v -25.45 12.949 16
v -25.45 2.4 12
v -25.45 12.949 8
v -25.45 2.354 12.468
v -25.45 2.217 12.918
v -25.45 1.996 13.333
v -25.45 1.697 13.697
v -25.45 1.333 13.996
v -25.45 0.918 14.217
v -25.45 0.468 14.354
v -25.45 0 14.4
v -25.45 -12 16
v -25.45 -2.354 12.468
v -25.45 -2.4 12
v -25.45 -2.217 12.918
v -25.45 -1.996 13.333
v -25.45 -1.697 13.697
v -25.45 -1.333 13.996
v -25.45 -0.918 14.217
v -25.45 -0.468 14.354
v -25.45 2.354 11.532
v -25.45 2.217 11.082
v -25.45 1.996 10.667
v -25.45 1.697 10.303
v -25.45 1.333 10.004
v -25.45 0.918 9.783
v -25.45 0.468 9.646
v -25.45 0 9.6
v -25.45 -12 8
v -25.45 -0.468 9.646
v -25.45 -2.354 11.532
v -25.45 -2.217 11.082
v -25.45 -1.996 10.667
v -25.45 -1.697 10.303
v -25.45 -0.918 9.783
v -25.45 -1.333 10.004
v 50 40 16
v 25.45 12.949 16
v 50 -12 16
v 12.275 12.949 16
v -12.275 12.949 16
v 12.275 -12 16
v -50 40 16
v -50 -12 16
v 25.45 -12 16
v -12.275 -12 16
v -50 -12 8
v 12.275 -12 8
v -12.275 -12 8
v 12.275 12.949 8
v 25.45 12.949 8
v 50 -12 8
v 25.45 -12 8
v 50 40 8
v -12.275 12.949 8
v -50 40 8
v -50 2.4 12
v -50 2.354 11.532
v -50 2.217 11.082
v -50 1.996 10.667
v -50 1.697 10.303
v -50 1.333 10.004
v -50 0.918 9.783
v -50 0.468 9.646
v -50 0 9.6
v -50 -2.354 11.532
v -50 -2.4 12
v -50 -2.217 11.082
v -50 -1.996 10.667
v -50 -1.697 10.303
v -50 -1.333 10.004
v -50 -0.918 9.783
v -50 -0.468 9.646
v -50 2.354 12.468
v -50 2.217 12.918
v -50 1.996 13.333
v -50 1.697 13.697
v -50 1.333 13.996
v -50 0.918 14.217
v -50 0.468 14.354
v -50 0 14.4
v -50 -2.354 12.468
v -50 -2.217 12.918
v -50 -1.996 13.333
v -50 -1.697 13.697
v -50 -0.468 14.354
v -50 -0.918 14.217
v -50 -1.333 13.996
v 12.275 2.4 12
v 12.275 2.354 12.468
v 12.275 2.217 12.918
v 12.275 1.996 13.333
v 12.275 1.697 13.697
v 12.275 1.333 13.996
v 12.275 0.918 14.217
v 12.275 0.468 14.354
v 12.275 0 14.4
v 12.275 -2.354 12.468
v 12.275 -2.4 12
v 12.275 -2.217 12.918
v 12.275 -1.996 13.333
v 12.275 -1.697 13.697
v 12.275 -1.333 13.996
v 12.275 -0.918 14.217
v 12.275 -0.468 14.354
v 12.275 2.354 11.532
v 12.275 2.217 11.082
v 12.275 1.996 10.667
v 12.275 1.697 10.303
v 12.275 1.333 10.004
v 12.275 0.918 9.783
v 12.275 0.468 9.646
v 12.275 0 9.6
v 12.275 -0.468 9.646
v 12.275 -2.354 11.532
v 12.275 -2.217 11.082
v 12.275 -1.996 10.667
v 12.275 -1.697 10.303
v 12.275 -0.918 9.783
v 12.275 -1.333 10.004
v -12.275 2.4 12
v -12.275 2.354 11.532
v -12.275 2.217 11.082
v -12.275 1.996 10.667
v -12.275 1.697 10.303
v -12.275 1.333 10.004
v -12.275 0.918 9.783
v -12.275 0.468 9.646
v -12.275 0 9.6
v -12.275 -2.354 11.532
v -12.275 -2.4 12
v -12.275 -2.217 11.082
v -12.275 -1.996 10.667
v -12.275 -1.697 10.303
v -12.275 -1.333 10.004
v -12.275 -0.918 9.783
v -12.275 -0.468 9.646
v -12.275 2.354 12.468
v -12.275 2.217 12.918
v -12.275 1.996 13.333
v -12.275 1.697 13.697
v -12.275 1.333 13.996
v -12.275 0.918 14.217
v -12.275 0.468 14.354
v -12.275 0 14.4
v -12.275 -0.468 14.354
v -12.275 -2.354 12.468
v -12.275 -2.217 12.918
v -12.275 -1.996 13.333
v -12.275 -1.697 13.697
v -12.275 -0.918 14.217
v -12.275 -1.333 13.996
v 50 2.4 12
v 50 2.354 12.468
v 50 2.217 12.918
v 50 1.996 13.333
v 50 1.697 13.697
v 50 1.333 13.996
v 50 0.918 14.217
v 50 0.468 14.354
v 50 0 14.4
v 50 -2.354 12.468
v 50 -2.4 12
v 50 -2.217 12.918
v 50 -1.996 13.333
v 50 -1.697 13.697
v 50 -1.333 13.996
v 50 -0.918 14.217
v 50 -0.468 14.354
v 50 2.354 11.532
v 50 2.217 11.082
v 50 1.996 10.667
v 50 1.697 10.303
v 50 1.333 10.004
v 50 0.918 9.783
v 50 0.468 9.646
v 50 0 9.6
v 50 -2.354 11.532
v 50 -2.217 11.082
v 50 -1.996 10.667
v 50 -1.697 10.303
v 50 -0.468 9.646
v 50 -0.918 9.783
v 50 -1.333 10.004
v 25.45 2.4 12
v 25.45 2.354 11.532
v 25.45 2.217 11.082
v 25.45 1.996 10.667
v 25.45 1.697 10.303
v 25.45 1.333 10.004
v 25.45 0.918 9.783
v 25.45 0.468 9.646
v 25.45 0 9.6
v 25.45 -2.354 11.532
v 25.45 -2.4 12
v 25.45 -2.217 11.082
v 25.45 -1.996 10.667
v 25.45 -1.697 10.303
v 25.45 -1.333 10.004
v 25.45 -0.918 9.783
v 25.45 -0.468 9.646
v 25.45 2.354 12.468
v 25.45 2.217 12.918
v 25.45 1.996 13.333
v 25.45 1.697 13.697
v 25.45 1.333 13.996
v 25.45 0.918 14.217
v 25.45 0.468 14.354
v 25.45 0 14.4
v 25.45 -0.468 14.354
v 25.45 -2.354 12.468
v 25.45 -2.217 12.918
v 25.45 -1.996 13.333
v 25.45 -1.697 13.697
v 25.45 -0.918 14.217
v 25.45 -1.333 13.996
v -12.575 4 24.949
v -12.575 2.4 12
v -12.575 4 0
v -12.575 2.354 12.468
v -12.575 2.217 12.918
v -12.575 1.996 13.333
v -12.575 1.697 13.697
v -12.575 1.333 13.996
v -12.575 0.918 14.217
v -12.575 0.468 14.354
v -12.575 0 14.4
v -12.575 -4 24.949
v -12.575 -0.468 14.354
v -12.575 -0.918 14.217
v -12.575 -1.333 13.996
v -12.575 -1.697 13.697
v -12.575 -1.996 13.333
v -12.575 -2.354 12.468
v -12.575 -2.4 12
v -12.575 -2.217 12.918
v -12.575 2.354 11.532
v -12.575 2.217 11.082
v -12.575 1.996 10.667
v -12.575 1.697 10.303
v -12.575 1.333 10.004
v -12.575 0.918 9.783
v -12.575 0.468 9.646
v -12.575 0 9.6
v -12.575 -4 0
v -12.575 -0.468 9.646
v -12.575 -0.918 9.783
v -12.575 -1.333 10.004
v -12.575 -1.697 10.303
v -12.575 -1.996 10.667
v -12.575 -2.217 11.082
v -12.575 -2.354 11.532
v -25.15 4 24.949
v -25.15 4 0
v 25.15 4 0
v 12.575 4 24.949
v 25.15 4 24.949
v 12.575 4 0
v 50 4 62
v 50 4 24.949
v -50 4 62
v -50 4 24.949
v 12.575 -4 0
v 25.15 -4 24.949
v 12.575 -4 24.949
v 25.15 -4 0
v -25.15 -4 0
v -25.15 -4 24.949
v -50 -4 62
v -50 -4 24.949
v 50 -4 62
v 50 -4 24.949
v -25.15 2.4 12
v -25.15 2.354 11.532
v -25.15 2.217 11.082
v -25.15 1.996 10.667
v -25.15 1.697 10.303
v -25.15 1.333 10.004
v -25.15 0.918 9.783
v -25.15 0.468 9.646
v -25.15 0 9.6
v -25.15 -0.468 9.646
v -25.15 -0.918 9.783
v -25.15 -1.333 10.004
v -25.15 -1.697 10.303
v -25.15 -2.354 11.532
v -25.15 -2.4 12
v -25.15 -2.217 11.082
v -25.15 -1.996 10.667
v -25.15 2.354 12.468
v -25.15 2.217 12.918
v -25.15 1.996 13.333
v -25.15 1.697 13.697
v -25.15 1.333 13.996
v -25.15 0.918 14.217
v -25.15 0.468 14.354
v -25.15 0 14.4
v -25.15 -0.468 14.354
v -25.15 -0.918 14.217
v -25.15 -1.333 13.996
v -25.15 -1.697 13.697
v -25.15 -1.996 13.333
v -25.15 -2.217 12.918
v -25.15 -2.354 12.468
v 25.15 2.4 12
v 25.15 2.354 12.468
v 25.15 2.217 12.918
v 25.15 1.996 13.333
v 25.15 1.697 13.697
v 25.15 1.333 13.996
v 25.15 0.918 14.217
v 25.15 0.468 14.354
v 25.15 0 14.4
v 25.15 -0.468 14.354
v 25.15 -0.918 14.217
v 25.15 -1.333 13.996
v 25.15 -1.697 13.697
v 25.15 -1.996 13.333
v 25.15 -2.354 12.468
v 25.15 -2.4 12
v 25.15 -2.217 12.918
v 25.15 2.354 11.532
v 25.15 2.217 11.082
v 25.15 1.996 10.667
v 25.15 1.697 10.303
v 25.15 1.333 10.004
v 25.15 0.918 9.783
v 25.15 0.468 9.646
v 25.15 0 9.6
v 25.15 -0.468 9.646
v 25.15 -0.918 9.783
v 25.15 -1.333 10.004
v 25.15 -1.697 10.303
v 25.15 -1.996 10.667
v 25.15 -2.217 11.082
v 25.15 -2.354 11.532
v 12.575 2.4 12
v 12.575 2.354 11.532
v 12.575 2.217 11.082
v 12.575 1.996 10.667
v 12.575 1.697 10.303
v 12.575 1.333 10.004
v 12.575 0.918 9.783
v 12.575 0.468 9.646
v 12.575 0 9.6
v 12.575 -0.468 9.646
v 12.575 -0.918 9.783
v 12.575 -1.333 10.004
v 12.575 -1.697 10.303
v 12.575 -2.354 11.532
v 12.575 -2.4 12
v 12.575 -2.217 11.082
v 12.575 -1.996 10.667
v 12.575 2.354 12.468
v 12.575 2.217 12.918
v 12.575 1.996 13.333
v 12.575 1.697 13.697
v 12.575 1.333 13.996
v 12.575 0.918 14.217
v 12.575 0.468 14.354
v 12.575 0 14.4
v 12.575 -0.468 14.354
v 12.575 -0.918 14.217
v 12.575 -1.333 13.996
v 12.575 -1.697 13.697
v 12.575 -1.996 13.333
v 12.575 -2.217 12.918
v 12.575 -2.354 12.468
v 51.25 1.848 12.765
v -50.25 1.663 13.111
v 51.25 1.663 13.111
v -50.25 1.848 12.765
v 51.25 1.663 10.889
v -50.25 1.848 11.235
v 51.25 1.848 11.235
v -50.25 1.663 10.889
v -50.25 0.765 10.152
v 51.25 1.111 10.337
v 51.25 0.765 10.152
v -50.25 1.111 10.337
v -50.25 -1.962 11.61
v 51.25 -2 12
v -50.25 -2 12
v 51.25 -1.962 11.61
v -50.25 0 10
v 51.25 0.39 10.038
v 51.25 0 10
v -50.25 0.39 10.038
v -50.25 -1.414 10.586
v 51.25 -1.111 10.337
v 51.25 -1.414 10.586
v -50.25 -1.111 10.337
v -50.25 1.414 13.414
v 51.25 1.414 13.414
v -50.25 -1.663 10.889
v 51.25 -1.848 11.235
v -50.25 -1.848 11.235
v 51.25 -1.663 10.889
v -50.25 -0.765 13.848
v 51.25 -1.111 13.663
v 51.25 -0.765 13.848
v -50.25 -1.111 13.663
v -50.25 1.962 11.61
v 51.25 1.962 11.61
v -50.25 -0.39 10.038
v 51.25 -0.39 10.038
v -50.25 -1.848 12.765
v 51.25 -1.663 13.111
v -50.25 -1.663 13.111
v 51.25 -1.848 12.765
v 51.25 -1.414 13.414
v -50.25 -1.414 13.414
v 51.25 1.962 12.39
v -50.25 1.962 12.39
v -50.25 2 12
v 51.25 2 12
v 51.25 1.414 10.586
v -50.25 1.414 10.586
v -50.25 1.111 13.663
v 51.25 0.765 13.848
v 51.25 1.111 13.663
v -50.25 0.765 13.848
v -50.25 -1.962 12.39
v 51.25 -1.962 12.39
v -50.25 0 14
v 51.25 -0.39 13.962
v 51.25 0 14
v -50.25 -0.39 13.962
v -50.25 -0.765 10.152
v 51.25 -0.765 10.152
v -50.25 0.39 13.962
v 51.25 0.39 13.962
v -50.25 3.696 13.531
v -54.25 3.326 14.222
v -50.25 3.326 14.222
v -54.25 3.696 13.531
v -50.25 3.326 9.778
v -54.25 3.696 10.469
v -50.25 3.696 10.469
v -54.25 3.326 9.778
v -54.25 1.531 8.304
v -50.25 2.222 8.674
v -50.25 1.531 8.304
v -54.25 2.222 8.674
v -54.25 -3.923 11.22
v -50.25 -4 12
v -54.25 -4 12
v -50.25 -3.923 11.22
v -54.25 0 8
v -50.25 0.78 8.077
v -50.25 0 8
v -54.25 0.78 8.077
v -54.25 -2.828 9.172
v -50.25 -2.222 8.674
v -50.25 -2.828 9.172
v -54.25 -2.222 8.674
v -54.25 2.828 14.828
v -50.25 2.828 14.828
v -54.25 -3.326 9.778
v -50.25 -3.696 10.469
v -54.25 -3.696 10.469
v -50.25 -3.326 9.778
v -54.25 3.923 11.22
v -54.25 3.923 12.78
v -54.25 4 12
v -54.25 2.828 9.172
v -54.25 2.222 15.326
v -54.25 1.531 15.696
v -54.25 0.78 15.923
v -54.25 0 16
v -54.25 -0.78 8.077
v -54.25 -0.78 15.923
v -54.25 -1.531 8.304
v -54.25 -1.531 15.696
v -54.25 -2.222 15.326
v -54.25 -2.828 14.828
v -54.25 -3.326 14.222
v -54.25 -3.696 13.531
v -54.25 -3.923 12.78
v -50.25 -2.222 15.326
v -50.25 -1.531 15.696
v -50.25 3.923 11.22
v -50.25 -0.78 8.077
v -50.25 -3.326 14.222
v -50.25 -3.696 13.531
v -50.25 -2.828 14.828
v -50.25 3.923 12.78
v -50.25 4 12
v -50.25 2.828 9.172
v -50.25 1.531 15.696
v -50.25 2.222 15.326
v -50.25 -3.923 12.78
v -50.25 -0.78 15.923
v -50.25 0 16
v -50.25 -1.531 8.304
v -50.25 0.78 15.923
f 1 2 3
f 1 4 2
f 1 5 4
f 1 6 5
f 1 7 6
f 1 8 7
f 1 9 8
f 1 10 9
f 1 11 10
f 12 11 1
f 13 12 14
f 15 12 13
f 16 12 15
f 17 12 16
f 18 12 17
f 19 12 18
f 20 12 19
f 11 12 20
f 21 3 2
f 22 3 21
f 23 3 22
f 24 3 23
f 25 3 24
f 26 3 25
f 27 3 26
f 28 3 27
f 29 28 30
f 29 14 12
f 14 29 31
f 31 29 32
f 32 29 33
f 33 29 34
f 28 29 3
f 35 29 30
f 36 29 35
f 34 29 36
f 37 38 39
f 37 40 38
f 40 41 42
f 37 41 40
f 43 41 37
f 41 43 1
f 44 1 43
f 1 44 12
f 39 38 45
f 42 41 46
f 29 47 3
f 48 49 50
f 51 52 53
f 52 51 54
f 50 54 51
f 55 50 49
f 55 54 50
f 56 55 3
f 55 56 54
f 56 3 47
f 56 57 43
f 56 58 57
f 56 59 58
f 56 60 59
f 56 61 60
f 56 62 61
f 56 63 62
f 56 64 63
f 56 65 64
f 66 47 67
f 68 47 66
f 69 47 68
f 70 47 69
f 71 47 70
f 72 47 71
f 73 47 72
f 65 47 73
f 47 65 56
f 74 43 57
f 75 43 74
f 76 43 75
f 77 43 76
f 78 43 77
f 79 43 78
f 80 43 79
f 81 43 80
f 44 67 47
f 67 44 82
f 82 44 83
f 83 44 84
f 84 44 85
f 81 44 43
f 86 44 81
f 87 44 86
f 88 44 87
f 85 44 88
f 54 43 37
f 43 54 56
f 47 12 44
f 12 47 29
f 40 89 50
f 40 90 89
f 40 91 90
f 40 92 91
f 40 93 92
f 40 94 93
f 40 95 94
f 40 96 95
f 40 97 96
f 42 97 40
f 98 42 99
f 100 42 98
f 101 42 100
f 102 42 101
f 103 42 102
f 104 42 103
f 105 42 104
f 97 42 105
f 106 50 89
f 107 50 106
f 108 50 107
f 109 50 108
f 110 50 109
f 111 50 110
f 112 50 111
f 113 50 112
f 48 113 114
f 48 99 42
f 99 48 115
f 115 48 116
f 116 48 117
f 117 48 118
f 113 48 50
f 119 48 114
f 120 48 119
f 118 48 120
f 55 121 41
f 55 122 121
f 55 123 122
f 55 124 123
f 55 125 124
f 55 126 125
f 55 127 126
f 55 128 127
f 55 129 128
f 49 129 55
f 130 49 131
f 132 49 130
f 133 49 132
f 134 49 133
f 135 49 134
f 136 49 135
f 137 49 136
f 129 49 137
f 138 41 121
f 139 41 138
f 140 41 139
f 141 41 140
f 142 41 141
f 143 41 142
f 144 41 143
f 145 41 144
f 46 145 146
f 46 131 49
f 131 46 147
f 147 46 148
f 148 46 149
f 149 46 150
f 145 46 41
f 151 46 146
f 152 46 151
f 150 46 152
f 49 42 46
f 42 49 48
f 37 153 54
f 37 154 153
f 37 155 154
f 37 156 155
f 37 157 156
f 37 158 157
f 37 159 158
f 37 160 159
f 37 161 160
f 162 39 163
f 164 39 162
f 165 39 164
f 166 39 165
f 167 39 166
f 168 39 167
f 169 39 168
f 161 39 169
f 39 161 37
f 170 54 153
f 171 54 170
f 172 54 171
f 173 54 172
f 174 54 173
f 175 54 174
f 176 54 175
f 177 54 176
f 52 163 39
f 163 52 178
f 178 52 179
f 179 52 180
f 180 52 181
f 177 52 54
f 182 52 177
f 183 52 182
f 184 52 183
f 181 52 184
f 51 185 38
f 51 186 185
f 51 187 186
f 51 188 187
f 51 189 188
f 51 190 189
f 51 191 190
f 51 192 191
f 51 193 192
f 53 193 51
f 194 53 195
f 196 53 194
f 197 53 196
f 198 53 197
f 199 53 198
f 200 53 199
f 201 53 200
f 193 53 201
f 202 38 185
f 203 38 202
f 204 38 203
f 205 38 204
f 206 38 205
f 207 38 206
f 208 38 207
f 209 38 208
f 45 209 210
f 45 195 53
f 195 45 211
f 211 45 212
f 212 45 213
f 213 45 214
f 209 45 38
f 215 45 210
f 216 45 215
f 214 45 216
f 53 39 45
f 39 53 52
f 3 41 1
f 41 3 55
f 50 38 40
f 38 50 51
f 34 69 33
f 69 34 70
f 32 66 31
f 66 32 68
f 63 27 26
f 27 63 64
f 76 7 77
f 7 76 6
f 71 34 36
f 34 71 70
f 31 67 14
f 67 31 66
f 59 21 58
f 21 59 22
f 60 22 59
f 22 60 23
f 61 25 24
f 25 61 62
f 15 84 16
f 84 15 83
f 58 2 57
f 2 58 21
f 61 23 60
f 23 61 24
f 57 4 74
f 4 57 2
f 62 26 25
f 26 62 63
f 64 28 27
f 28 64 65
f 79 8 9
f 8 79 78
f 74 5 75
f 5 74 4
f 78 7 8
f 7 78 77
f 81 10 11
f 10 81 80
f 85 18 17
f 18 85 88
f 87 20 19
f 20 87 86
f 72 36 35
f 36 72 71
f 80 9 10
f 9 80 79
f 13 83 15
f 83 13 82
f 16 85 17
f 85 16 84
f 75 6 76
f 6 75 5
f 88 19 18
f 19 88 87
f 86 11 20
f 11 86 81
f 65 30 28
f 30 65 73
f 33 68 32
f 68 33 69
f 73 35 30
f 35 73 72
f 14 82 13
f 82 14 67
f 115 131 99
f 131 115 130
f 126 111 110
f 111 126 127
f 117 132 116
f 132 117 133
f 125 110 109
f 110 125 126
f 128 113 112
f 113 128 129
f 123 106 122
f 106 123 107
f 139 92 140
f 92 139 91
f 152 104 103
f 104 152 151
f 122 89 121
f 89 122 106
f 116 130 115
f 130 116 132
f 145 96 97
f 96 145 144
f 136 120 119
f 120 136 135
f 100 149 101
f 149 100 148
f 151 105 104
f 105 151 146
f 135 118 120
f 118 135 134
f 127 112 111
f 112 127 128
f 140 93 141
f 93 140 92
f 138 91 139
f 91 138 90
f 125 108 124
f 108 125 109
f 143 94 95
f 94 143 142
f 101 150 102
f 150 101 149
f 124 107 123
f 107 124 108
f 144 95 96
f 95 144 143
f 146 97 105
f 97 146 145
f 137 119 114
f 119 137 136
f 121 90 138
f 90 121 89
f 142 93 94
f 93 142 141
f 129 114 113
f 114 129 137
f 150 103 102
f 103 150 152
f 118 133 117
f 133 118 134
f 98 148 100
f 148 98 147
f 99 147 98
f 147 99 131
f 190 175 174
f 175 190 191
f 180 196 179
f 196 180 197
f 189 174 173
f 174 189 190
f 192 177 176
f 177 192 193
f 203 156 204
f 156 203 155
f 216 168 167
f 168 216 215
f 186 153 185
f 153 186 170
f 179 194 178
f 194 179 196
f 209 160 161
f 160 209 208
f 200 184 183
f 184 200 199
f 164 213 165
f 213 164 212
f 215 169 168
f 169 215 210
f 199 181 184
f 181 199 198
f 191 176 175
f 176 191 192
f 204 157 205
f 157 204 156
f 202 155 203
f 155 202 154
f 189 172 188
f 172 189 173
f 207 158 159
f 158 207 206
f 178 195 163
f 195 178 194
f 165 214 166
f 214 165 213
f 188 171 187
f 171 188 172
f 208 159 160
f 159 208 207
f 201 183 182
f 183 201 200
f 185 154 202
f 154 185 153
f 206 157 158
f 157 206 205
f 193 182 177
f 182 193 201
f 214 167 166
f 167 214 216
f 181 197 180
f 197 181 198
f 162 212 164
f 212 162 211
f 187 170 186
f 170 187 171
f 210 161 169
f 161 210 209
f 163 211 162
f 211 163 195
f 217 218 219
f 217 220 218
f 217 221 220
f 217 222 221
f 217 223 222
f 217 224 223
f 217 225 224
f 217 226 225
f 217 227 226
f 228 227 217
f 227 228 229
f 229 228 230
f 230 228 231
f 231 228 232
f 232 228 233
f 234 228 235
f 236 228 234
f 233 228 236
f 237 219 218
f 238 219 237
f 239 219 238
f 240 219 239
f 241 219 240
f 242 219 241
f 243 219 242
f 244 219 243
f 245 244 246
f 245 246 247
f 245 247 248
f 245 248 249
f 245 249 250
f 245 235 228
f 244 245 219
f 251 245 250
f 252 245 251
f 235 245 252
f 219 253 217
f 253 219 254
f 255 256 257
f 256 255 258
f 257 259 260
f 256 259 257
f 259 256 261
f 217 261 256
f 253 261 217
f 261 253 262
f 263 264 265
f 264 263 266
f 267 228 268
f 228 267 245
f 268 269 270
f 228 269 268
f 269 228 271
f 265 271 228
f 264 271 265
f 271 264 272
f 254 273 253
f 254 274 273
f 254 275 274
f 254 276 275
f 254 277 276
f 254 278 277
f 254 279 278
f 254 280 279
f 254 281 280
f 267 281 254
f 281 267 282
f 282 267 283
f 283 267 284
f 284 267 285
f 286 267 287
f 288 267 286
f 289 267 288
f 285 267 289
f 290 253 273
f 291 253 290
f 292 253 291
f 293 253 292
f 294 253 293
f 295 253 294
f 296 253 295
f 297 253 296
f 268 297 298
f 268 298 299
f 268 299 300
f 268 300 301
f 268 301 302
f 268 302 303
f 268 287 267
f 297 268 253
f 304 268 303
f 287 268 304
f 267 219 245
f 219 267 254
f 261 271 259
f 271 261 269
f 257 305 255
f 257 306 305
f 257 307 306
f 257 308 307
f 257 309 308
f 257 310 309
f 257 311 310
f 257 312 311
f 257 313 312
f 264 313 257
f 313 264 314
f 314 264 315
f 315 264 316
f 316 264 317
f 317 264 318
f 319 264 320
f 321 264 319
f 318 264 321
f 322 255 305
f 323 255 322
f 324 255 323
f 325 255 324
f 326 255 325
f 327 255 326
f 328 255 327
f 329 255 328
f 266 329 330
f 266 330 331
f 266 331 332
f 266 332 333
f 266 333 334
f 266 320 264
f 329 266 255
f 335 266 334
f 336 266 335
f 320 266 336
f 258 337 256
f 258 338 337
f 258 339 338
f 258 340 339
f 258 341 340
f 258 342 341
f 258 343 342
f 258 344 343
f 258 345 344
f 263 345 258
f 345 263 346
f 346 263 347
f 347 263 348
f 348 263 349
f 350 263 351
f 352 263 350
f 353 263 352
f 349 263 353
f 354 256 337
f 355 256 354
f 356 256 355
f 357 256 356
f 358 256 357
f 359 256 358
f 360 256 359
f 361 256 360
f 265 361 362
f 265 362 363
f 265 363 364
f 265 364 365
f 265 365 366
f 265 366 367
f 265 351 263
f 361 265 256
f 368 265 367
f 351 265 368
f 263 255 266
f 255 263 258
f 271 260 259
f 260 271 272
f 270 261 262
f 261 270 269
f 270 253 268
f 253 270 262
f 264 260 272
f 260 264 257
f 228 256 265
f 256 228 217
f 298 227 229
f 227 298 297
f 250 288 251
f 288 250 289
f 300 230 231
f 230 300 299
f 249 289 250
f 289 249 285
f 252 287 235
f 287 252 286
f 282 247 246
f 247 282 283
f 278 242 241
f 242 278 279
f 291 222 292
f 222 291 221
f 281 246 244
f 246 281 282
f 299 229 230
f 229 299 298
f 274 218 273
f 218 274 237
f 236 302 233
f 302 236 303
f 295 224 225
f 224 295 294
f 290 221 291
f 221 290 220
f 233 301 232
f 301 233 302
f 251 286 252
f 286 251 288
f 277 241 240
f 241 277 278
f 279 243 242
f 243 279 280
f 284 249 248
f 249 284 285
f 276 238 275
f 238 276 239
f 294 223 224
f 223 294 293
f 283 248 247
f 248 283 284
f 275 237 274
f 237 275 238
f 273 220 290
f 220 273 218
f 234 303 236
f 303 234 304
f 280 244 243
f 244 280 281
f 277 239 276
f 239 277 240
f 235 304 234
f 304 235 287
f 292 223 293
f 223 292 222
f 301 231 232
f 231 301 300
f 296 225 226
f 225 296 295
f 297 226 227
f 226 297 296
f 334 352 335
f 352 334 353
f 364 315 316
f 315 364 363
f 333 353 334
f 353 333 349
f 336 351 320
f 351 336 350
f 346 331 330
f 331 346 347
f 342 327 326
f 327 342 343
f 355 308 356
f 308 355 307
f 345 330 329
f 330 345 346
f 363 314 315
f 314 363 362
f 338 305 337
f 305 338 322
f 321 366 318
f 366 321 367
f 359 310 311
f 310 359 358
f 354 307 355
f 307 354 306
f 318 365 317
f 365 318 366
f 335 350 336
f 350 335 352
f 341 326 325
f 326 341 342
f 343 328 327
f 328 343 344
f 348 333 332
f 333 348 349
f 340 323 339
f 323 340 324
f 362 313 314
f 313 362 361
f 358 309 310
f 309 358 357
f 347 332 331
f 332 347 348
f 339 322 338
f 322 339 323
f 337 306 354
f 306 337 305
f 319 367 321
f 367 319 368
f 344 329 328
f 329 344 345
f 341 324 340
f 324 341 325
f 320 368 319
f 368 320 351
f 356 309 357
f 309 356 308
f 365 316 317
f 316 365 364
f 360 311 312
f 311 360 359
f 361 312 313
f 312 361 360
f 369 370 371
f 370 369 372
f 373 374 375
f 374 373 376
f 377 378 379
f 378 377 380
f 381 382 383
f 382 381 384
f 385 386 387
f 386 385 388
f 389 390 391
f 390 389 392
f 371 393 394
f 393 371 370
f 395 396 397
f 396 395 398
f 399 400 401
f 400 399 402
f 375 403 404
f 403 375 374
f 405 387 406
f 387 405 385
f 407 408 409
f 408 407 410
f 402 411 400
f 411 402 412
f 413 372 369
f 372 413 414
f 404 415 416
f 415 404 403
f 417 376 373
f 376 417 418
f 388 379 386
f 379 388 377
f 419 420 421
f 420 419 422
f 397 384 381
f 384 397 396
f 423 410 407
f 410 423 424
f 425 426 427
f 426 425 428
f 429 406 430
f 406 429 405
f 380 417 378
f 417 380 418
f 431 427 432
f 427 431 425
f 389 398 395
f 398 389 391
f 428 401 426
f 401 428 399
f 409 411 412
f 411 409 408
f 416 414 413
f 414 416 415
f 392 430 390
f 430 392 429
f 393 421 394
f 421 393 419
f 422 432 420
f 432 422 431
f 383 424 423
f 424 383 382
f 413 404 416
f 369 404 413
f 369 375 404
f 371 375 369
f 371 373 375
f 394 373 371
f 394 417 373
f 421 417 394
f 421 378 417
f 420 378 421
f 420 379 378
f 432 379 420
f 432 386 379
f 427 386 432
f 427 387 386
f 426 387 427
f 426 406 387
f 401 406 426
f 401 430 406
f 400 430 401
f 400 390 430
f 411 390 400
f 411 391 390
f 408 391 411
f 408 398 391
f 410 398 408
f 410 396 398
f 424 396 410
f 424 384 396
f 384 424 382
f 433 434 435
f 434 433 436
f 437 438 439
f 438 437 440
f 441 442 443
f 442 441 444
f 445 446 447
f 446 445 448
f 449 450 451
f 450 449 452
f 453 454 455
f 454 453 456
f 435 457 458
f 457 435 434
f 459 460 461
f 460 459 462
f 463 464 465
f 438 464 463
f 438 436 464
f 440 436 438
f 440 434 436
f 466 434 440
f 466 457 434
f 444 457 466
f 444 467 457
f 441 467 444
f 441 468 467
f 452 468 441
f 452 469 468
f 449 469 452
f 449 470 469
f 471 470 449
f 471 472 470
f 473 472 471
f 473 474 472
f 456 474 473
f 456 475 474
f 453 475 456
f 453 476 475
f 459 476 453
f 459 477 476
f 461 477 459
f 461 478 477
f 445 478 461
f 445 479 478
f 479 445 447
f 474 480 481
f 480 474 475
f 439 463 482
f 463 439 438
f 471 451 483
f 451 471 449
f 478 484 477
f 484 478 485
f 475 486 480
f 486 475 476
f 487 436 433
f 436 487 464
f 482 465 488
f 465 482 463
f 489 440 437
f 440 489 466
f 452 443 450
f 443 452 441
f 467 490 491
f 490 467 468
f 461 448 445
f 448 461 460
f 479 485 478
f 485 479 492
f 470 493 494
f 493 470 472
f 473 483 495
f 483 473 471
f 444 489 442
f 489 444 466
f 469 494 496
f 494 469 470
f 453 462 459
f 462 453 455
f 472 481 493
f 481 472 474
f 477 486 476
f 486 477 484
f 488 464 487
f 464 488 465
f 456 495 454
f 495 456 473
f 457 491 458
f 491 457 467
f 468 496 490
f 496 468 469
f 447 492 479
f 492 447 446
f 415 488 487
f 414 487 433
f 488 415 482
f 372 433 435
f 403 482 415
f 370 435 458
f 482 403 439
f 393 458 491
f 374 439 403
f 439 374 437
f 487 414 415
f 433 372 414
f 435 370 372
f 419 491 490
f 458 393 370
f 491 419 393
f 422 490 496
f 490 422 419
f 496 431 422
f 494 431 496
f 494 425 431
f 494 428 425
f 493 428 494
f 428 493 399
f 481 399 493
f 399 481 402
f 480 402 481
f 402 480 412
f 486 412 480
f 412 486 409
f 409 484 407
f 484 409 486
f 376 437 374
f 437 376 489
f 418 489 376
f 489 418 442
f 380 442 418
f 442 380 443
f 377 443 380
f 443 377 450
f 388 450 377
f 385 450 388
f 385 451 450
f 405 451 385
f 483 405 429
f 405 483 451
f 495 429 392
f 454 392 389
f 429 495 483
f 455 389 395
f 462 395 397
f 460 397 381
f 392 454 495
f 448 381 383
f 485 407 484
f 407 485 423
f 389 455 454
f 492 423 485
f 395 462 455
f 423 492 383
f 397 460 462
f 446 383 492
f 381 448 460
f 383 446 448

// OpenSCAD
$fn = 32;

// ------------------------------------------------------------------------
// Butt hinge: hinge 100 mm, leaf swung 270 deg
// Every part is its own module, assembly() places every instance.
// ------------------------------------------------------------------------

// --- part 1 ---
module hinge_base() {
  difference() {
    union() {
      translate([-50, -12, -4]) cube([24.55, 52, 8]);
      translate([-12.275, -12, -4]) cube([24.55, 52, 8]);
      translate([25.45, -12, -4]) cube([24.55, 52, 8]);
      translate([-50, 12.949, -4]) cube([100, 27.051, 8]);
    }
    translate([-37.725, 0, 0]) rotate([0, 90, 0]) cylinder(h = 26.55, d = 4.8, center = true);
    translate([0, 0, 0]) rotate([0, 90, 0]) cylinder(h = 26.55, d = 4.8, center = true);
    translate([37.725, 0, 0]) rotate([0, 90, 0]) cylinder(h = 26.55, d = 4.8, center = true);
  }
}

// --- part 2 ---
module hinge_mover() {
  difference() {
    union() {
      translate([-25.15, -50, -4]) cube([12.575, 62, 8]);
      translate([12.575, -50, -4]) cube([12.575, 62, 8]);
      translate([-50, -50, -4]) cube([100, 37.051, 8]);
    }
    translate([-18.863, 0, 0]) rotate([0, 90, 0]) cylinder(h = 14.575, d = 4.8, center = true);
    translate([18.863, 0, 0]) rotate([0, 90, 0]) cylinder(h = 14.575, d = 4.8, center = true);
  }
}

// --- part 3 ---
module hinge_pin() {
  rotate([0, 90, 0]) cylinder(h = 102.5, d = 4, center = true);
  translate([-54.25, 0, 0]) rotate([0, 90, 0]) cylinder(h = 4, d = 8);
}

// --- assembly ---
module assembly() {
  color([0.80, 0.24, 0.20]) translate([0, 0, 12]) rotate([0, 0, 0]) hinge_base();
  color([0.20, 0.45, 0.75]) translate([0, 0, 12]) rotate([270, 0, 0]) hinge_mover();
  color([0.25, 0.62, 0.32]) translate([0, 0, 12]) rotate([0, 0, 0]) hinge_pin();
}

assembly();
